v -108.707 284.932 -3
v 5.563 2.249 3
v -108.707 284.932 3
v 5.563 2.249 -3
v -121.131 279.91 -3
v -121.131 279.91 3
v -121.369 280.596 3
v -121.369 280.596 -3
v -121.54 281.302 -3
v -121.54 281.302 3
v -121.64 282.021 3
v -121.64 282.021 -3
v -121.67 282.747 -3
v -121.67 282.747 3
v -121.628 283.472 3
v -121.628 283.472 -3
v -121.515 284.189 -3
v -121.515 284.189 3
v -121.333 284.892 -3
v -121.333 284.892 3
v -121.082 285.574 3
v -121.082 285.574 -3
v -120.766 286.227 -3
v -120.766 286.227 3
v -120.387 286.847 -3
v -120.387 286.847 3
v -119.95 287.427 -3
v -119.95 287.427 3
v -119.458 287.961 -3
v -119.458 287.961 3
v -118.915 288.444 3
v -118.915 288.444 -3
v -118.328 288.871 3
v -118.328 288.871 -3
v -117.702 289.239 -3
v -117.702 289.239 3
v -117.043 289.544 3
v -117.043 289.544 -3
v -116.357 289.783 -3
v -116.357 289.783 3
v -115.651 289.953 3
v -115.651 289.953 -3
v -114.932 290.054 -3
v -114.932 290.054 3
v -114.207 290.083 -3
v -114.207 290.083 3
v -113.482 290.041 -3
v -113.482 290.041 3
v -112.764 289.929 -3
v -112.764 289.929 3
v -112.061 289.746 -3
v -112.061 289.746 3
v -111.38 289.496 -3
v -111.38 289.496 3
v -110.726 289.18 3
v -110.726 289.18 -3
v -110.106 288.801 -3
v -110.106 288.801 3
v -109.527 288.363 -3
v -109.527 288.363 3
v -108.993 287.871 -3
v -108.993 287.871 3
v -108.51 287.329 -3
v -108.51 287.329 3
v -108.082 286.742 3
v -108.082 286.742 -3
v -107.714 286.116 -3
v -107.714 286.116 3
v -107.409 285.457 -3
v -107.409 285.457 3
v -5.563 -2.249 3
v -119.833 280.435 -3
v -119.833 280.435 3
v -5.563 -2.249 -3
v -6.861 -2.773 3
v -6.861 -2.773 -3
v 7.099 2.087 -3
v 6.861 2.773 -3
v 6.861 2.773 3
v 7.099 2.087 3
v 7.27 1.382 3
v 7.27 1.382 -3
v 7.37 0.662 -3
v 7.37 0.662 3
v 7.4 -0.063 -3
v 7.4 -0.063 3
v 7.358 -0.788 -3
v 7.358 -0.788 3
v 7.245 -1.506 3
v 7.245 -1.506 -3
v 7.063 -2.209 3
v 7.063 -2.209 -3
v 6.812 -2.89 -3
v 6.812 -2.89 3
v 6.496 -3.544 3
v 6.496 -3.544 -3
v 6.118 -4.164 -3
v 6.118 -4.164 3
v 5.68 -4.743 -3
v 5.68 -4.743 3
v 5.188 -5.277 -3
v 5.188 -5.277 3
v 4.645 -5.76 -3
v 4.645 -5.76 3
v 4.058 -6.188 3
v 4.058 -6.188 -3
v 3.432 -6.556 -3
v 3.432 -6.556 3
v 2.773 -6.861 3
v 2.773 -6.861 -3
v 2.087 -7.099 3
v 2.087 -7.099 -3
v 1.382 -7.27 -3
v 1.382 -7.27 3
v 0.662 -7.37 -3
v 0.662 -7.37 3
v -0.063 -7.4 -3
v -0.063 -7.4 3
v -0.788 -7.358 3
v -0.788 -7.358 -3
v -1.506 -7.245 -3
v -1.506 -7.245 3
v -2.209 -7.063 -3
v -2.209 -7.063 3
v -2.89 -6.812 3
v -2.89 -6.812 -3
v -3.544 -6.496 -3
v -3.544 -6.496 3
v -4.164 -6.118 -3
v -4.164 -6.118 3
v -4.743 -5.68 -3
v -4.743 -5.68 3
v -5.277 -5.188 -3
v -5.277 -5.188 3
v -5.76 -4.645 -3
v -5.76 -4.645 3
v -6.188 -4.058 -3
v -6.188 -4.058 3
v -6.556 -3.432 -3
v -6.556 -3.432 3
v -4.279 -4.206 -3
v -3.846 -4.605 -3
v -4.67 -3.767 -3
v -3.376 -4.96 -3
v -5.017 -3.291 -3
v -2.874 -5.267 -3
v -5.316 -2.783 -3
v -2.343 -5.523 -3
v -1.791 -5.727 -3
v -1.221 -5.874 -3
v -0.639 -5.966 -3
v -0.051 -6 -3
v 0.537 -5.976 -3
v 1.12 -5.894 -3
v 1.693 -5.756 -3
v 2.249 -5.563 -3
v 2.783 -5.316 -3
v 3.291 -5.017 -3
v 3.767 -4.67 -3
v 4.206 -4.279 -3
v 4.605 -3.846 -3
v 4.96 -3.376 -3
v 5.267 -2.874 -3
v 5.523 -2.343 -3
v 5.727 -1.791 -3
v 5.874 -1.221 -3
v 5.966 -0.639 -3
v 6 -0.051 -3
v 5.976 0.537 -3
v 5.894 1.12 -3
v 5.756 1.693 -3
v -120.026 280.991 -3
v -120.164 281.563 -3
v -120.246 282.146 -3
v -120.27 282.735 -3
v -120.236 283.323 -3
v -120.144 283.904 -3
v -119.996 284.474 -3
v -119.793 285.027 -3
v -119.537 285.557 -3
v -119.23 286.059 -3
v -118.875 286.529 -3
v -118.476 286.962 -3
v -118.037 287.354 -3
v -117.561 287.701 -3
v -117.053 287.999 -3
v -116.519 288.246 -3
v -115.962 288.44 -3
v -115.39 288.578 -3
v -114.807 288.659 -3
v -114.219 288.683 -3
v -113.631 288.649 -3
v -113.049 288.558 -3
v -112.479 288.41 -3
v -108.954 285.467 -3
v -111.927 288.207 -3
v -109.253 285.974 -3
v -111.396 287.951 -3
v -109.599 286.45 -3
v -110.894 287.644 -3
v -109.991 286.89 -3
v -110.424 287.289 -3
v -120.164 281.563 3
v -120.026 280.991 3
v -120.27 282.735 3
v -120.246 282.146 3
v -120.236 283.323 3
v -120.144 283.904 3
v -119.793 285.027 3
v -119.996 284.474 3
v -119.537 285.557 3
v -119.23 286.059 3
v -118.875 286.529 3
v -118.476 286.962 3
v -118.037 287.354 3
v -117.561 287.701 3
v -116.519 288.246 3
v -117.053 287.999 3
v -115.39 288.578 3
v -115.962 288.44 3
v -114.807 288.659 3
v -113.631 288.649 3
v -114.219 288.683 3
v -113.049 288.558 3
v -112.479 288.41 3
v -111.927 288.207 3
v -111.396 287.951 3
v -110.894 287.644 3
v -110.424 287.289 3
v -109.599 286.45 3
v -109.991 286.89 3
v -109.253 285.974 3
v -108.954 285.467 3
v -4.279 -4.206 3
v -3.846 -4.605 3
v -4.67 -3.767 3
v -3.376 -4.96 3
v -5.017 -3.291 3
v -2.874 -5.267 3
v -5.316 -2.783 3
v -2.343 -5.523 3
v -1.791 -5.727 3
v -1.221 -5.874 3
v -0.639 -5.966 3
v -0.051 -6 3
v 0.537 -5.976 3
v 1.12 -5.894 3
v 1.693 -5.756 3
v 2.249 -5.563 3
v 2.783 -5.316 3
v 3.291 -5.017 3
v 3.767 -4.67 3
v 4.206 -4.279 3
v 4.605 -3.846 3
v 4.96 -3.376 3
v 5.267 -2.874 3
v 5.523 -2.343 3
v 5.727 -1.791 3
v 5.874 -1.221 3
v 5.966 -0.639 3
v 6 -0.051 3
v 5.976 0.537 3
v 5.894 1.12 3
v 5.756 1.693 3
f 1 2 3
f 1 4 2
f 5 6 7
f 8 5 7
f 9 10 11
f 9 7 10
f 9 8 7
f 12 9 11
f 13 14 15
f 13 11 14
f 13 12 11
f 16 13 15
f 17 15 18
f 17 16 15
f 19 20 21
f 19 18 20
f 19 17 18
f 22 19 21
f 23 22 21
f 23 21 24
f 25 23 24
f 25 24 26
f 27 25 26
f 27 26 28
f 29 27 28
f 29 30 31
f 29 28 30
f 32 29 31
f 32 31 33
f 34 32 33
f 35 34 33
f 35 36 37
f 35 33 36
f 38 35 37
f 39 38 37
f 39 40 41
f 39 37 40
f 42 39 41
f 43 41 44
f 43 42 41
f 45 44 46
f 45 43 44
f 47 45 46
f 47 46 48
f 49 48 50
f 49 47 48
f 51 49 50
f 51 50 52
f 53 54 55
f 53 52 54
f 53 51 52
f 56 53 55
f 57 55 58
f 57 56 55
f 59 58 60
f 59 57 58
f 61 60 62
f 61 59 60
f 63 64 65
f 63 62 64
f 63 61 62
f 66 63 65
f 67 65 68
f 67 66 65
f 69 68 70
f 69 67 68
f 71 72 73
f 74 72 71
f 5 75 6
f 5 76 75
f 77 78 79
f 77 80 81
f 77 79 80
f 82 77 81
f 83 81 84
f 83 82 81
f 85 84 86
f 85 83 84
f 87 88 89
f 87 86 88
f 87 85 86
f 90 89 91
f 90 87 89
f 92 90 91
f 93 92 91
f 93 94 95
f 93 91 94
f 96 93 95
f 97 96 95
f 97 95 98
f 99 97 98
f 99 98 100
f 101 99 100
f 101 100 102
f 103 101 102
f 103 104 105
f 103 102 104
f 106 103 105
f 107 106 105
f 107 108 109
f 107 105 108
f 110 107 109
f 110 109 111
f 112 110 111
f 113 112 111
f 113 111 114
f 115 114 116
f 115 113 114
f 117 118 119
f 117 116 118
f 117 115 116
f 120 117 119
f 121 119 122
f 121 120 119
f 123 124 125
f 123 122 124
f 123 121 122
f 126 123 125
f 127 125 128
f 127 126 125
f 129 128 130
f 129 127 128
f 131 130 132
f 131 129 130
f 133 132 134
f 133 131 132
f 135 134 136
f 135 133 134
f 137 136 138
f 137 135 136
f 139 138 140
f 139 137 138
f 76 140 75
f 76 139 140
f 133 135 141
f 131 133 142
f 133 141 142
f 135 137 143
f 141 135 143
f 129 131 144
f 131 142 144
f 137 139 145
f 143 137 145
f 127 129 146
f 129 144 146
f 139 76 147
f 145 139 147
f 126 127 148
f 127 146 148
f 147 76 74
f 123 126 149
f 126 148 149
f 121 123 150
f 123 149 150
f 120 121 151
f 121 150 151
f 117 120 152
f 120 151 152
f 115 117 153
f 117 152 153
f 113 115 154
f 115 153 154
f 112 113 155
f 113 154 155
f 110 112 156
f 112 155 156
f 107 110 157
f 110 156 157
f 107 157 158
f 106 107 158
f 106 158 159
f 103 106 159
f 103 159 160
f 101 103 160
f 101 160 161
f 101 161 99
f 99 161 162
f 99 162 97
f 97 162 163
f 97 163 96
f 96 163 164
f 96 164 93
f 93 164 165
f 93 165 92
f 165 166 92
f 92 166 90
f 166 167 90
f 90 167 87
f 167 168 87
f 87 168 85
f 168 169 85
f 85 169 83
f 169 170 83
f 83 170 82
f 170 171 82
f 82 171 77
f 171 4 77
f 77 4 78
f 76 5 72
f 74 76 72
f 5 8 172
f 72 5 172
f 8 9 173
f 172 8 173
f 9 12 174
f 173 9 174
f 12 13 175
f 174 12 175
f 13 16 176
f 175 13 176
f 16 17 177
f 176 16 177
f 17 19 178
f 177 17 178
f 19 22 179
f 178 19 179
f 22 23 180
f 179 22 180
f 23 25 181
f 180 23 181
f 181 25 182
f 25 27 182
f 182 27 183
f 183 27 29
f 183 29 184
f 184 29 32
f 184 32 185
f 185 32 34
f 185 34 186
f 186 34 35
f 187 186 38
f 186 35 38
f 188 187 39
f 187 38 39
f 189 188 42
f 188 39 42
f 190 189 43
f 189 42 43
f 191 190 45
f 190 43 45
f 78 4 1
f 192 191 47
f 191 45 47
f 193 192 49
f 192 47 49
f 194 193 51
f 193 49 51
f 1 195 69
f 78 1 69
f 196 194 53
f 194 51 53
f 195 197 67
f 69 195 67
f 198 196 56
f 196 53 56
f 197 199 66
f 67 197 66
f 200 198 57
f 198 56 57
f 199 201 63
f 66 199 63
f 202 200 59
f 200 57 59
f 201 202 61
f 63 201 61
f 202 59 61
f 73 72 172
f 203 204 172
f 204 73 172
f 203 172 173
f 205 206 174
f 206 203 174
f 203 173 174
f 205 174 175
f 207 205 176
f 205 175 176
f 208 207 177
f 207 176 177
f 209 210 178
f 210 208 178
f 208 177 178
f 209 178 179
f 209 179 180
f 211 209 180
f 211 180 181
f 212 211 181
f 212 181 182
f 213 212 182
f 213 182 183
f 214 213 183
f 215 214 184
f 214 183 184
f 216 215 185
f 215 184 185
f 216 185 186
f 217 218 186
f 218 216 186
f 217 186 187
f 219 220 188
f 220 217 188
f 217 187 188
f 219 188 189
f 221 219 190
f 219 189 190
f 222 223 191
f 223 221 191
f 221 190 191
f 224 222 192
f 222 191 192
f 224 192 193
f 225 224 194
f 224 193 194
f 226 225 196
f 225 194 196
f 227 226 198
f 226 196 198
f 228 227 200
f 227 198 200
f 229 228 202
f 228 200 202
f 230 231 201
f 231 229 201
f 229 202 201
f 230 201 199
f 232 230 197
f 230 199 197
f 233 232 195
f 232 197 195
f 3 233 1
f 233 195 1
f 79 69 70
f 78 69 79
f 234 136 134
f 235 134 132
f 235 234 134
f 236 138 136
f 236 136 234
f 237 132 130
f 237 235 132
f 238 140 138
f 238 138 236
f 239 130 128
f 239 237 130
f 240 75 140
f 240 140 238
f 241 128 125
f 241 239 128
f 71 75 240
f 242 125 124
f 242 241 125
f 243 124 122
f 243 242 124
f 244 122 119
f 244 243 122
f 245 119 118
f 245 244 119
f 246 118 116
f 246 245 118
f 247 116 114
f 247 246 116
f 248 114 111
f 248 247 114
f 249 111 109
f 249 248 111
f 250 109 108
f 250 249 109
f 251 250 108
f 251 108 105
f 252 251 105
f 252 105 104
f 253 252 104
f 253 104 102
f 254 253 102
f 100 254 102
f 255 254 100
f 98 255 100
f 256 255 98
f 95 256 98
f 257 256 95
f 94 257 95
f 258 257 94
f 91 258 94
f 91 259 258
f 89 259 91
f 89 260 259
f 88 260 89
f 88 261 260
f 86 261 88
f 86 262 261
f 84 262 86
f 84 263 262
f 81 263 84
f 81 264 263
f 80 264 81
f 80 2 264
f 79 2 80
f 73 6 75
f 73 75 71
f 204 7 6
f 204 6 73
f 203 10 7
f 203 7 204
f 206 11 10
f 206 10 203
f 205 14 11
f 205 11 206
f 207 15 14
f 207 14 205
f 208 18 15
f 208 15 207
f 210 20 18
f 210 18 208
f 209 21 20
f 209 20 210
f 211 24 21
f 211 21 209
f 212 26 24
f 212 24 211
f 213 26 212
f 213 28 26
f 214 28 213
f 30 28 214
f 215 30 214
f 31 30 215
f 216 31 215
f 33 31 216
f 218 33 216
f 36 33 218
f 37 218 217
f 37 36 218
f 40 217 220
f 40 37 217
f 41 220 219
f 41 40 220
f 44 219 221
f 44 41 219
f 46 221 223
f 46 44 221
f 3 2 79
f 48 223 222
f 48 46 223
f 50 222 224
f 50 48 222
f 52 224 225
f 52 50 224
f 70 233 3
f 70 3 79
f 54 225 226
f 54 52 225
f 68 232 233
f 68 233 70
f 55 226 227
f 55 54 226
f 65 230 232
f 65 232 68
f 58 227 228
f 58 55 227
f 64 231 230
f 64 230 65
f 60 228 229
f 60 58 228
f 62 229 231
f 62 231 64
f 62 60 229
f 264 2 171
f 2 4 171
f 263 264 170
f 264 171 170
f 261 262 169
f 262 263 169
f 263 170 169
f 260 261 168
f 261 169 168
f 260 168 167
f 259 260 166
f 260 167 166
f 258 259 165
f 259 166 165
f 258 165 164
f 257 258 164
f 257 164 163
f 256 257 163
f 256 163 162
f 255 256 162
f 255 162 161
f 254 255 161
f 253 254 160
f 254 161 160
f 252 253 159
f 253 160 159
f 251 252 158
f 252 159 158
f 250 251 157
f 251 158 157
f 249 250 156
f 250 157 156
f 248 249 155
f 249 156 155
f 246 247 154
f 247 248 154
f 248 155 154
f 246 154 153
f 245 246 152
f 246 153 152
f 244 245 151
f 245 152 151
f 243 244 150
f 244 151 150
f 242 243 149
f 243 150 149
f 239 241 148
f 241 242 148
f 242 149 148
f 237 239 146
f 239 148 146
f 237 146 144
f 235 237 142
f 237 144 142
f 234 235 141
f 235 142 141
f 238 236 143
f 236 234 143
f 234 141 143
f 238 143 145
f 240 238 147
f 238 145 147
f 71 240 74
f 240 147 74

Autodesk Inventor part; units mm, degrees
ref_plane "YZ Plane" through (0, 0, 0) normal (1, 0, 0) x (0, 1, 0)
ref_plane "XZ Plane" through (0, 0, 0) normal (0, 1, 0) x (-1, 0, 0)
ref_plane "XY Plane" through (0, 0, 0) normal (0, 0, 1) x (1, 0, 0)
sketch "Эскиз1" plane through (0, 0, 0) normal (0, 0, 1) x (1, 0, 0)
  arc A0 (-5.5627, -2.2486) -> (5.5627, 2.2486) centre (0, 0) ccw
  circle A1 centre (-114.2699, 282.6835) radius 2.5 projected
  arc A2 (-108.7072, 284.9321) -> (-119.8326, 280.4348) centre (-114.2699, 282.6835) ccw
  arc A3 (-107.4093, 285.4568) -> (-121.1306, 279.9102) centre (-114.2699, 282.6835) ccw
  line L0 (-107.4093, 285.4568) -> (6.8607, 2.7733)
  line L1 (-6.8607, -2.7733) -> (-121.1306, 279.9102)
  line L2 (5.5627, 2.2486) -> (-108.7072, 284.9321)
  line L3 (-119.8326, 280.4348) -> (-5.5627, -2.2486)
  arc A4 (-6.8607, -2.7733) -> (6.8607, 2.7733) centre (0, 0) ccw
  dimension "d0" = 12
  dimension "d1" = 1.4
  dimension "d3" = 12
  dimension "d4" = 1.4
extrude "Выдавливание1" add sketch "Эскиз1" along normal mid plane 6 contours L0 A4 L1 A3
properties part number "ремень оси y"
